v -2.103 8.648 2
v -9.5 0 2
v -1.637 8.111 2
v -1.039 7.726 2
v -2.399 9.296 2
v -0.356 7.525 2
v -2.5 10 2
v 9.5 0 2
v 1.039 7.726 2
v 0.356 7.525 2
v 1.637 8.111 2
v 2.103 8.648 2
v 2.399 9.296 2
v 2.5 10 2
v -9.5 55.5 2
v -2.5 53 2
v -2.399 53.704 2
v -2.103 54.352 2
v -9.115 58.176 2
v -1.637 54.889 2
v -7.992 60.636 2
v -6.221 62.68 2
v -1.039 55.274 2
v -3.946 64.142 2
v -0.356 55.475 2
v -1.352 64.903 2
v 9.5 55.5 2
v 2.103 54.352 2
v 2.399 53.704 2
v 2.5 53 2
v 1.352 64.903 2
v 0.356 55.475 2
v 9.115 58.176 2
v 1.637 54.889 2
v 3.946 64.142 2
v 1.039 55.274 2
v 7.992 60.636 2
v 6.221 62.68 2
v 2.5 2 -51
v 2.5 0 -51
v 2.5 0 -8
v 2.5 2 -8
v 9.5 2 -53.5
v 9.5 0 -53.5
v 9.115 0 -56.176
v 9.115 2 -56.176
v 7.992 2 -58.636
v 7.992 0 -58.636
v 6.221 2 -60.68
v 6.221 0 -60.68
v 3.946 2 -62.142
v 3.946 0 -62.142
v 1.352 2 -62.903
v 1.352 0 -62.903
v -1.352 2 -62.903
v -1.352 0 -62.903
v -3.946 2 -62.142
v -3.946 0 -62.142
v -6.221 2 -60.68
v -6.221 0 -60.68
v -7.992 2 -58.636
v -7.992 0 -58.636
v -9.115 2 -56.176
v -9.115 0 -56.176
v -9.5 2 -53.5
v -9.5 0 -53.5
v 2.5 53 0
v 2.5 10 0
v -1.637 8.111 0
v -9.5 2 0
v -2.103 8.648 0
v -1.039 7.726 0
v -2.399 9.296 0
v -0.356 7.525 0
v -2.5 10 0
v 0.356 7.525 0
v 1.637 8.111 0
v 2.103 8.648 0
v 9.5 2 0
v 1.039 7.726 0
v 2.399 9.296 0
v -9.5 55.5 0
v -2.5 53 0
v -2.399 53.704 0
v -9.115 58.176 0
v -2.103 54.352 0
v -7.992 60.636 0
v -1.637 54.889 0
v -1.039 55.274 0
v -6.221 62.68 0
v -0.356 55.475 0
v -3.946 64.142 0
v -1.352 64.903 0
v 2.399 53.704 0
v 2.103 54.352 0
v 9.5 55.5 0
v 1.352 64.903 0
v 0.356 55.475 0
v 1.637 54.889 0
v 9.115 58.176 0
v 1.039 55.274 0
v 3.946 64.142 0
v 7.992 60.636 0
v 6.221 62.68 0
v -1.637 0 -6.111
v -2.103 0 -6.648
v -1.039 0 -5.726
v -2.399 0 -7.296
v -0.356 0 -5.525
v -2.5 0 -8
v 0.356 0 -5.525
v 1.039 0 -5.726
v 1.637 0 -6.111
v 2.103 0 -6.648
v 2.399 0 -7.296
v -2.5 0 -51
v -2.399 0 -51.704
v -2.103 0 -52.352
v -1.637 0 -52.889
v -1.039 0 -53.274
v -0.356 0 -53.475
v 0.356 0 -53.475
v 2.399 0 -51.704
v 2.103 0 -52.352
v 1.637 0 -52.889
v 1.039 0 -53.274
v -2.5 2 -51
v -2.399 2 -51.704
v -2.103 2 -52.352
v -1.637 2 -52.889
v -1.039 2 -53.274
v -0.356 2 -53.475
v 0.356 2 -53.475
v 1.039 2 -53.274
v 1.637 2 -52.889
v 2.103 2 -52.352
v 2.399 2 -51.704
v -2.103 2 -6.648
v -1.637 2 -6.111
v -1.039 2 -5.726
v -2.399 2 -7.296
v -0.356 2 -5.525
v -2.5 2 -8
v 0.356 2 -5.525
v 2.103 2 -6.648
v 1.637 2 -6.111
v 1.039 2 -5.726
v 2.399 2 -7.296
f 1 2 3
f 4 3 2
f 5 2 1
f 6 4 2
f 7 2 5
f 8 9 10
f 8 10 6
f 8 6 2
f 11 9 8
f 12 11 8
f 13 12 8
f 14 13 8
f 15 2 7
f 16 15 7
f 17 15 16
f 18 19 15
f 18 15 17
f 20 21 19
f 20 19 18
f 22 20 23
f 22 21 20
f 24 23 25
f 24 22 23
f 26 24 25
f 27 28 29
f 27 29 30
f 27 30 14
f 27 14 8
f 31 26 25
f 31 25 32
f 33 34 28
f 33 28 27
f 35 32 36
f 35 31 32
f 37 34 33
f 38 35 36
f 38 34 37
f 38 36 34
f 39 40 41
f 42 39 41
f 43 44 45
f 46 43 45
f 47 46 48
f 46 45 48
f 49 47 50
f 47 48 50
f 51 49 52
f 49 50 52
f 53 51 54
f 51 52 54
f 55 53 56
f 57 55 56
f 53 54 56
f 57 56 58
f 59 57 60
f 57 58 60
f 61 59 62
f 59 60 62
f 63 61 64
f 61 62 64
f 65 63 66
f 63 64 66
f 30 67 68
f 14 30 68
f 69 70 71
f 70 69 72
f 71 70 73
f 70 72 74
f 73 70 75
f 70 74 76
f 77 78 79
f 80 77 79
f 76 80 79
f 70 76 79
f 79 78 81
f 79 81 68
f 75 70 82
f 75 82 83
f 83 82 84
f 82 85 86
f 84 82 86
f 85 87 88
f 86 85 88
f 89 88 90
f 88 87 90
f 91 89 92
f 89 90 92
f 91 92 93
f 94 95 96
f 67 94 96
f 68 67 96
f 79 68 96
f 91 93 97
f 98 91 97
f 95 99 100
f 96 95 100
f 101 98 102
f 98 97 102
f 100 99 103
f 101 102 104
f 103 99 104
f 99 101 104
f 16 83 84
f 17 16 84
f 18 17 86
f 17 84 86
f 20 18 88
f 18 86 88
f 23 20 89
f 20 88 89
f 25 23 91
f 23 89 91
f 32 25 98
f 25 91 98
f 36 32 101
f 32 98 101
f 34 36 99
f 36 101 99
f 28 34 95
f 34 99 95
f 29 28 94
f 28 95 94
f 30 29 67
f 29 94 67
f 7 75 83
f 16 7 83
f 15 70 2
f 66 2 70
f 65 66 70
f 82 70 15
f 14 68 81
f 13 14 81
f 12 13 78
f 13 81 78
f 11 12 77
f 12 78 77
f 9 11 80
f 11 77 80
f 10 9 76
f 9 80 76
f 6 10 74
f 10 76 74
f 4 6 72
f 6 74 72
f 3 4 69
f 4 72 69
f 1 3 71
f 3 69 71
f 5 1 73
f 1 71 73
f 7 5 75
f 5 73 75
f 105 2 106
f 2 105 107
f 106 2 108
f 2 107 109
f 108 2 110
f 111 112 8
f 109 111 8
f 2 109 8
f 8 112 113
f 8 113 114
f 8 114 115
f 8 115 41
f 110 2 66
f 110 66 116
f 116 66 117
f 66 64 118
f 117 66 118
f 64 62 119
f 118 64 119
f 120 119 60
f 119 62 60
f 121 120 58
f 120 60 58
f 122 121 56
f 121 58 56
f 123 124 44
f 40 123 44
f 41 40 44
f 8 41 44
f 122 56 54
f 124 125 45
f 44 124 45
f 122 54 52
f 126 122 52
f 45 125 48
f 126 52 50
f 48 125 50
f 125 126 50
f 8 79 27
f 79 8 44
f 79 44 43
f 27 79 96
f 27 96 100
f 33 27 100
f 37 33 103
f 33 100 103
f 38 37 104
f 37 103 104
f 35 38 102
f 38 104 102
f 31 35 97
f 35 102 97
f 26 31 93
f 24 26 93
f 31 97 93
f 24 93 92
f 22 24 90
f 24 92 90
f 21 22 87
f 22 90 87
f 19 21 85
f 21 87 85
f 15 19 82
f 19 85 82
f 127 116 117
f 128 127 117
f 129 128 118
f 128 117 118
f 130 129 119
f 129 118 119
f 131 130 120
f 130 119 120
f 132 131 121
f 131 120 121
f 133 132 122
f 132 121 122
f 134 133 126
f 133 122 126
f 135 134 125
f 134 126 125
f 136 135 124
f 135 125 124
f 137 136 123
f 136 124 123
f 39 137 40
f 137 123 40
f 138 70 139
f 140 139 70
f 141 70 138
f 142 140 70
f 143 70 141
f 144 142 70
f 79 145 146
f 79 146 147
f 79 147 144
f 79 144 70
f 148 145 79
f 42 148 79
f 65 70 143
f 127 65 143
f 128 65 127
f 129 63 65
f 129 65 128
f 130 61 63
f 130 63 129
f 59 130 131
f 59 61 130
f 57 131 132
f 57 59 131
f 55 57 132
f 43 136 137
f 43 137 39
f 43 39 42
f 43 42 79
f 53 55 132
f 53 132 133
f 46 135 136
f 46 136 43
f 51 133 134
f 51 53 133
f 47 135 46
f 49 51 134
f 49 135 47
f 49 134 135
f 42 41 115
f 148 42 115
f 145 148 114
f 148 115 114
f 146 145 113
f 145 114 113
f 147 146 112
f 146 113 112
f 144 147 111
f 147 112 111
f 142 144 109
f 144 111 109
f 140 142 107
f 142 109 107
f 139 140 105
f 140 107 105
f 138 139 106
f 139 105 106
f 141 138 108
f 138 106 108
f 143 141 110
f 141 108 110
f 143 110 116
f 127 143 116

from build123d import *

# Parameters (mm, degrees)
SKETCH_1_W      = 19
SKETCH_1_H      = 2.5
EXTRUDE_1_DEPTH = 2
EXTRUDE_2_DEPTH = 2


with BuildPart() as part:
    # 草图1 → 凸台-拉伸1 (new body)
    # profile 1 of 2: a face of its own
    with BuildSketch(Plane.XY):
        with BuildLine():
            Line((-9.5, 55.5), (-9.5, 2.5))
            Line((-9.5, 2.5), (9.5, 2.5))
            Line((9.5, 2.5), (9.5, 55.5))
            ThreePointArc((9.5, 55.5), (0, 65), (-9.5, 55.5))
        make_face()
        with BuildLine():
            ThreePointArc((-2.5, 53), (0, 55.5), (2.5, 53))
            Line((2.5, 53), (2.5, 10))
            ThreePointArc((2.5, 10), (0, 7.5), (-2.5, 10))
            Line((-2.5, 10), (-2.5, 53))
        make_face(mode=Mode.SUBTRACT)
    # profile 2 of 2: a face of its own
    with BuildSketch(Plane.XY):
        with Locations((0, 1.25)):
            Rectangle(SKETCH_1_W, SKETCH_1_H)
    extrude(amount=EXTRUDE_1_DEPTH)

    # 草图2 → 凸台-拉伸2 (add)
    with BuildSketch(Plane(origin=(0, 0, 0), x_dir=(1, 0, 0), z_dir=(0, 1, 0))):
        with BuildLine():
            Line((-9.5, -2), (9.5, -2))
            Line((9.5, -2), (9.5, 53.5))
            ThreePointArc((9.5, 53.5), (0, 63), (-9.5, 53.5))
            Line((-9.5, 53.5), (-9.5, -2))
        make_face()
        with BuildLine():
            Line((-2.5, 8), (-2.5, 51))
            ThreePointArc((-2.5, 51), (0, 53.5), (2.5, 51))
            Line((2.5, 51), (2.5, 8))
            ThreePointArc((2.5, 8), (0, 5.5), (-2.5, 8))
        make_face(mode=Mode.SUBTRACT)
    extrude(amount=EXTRUDE_2_DEPTH)


solid = part.part
